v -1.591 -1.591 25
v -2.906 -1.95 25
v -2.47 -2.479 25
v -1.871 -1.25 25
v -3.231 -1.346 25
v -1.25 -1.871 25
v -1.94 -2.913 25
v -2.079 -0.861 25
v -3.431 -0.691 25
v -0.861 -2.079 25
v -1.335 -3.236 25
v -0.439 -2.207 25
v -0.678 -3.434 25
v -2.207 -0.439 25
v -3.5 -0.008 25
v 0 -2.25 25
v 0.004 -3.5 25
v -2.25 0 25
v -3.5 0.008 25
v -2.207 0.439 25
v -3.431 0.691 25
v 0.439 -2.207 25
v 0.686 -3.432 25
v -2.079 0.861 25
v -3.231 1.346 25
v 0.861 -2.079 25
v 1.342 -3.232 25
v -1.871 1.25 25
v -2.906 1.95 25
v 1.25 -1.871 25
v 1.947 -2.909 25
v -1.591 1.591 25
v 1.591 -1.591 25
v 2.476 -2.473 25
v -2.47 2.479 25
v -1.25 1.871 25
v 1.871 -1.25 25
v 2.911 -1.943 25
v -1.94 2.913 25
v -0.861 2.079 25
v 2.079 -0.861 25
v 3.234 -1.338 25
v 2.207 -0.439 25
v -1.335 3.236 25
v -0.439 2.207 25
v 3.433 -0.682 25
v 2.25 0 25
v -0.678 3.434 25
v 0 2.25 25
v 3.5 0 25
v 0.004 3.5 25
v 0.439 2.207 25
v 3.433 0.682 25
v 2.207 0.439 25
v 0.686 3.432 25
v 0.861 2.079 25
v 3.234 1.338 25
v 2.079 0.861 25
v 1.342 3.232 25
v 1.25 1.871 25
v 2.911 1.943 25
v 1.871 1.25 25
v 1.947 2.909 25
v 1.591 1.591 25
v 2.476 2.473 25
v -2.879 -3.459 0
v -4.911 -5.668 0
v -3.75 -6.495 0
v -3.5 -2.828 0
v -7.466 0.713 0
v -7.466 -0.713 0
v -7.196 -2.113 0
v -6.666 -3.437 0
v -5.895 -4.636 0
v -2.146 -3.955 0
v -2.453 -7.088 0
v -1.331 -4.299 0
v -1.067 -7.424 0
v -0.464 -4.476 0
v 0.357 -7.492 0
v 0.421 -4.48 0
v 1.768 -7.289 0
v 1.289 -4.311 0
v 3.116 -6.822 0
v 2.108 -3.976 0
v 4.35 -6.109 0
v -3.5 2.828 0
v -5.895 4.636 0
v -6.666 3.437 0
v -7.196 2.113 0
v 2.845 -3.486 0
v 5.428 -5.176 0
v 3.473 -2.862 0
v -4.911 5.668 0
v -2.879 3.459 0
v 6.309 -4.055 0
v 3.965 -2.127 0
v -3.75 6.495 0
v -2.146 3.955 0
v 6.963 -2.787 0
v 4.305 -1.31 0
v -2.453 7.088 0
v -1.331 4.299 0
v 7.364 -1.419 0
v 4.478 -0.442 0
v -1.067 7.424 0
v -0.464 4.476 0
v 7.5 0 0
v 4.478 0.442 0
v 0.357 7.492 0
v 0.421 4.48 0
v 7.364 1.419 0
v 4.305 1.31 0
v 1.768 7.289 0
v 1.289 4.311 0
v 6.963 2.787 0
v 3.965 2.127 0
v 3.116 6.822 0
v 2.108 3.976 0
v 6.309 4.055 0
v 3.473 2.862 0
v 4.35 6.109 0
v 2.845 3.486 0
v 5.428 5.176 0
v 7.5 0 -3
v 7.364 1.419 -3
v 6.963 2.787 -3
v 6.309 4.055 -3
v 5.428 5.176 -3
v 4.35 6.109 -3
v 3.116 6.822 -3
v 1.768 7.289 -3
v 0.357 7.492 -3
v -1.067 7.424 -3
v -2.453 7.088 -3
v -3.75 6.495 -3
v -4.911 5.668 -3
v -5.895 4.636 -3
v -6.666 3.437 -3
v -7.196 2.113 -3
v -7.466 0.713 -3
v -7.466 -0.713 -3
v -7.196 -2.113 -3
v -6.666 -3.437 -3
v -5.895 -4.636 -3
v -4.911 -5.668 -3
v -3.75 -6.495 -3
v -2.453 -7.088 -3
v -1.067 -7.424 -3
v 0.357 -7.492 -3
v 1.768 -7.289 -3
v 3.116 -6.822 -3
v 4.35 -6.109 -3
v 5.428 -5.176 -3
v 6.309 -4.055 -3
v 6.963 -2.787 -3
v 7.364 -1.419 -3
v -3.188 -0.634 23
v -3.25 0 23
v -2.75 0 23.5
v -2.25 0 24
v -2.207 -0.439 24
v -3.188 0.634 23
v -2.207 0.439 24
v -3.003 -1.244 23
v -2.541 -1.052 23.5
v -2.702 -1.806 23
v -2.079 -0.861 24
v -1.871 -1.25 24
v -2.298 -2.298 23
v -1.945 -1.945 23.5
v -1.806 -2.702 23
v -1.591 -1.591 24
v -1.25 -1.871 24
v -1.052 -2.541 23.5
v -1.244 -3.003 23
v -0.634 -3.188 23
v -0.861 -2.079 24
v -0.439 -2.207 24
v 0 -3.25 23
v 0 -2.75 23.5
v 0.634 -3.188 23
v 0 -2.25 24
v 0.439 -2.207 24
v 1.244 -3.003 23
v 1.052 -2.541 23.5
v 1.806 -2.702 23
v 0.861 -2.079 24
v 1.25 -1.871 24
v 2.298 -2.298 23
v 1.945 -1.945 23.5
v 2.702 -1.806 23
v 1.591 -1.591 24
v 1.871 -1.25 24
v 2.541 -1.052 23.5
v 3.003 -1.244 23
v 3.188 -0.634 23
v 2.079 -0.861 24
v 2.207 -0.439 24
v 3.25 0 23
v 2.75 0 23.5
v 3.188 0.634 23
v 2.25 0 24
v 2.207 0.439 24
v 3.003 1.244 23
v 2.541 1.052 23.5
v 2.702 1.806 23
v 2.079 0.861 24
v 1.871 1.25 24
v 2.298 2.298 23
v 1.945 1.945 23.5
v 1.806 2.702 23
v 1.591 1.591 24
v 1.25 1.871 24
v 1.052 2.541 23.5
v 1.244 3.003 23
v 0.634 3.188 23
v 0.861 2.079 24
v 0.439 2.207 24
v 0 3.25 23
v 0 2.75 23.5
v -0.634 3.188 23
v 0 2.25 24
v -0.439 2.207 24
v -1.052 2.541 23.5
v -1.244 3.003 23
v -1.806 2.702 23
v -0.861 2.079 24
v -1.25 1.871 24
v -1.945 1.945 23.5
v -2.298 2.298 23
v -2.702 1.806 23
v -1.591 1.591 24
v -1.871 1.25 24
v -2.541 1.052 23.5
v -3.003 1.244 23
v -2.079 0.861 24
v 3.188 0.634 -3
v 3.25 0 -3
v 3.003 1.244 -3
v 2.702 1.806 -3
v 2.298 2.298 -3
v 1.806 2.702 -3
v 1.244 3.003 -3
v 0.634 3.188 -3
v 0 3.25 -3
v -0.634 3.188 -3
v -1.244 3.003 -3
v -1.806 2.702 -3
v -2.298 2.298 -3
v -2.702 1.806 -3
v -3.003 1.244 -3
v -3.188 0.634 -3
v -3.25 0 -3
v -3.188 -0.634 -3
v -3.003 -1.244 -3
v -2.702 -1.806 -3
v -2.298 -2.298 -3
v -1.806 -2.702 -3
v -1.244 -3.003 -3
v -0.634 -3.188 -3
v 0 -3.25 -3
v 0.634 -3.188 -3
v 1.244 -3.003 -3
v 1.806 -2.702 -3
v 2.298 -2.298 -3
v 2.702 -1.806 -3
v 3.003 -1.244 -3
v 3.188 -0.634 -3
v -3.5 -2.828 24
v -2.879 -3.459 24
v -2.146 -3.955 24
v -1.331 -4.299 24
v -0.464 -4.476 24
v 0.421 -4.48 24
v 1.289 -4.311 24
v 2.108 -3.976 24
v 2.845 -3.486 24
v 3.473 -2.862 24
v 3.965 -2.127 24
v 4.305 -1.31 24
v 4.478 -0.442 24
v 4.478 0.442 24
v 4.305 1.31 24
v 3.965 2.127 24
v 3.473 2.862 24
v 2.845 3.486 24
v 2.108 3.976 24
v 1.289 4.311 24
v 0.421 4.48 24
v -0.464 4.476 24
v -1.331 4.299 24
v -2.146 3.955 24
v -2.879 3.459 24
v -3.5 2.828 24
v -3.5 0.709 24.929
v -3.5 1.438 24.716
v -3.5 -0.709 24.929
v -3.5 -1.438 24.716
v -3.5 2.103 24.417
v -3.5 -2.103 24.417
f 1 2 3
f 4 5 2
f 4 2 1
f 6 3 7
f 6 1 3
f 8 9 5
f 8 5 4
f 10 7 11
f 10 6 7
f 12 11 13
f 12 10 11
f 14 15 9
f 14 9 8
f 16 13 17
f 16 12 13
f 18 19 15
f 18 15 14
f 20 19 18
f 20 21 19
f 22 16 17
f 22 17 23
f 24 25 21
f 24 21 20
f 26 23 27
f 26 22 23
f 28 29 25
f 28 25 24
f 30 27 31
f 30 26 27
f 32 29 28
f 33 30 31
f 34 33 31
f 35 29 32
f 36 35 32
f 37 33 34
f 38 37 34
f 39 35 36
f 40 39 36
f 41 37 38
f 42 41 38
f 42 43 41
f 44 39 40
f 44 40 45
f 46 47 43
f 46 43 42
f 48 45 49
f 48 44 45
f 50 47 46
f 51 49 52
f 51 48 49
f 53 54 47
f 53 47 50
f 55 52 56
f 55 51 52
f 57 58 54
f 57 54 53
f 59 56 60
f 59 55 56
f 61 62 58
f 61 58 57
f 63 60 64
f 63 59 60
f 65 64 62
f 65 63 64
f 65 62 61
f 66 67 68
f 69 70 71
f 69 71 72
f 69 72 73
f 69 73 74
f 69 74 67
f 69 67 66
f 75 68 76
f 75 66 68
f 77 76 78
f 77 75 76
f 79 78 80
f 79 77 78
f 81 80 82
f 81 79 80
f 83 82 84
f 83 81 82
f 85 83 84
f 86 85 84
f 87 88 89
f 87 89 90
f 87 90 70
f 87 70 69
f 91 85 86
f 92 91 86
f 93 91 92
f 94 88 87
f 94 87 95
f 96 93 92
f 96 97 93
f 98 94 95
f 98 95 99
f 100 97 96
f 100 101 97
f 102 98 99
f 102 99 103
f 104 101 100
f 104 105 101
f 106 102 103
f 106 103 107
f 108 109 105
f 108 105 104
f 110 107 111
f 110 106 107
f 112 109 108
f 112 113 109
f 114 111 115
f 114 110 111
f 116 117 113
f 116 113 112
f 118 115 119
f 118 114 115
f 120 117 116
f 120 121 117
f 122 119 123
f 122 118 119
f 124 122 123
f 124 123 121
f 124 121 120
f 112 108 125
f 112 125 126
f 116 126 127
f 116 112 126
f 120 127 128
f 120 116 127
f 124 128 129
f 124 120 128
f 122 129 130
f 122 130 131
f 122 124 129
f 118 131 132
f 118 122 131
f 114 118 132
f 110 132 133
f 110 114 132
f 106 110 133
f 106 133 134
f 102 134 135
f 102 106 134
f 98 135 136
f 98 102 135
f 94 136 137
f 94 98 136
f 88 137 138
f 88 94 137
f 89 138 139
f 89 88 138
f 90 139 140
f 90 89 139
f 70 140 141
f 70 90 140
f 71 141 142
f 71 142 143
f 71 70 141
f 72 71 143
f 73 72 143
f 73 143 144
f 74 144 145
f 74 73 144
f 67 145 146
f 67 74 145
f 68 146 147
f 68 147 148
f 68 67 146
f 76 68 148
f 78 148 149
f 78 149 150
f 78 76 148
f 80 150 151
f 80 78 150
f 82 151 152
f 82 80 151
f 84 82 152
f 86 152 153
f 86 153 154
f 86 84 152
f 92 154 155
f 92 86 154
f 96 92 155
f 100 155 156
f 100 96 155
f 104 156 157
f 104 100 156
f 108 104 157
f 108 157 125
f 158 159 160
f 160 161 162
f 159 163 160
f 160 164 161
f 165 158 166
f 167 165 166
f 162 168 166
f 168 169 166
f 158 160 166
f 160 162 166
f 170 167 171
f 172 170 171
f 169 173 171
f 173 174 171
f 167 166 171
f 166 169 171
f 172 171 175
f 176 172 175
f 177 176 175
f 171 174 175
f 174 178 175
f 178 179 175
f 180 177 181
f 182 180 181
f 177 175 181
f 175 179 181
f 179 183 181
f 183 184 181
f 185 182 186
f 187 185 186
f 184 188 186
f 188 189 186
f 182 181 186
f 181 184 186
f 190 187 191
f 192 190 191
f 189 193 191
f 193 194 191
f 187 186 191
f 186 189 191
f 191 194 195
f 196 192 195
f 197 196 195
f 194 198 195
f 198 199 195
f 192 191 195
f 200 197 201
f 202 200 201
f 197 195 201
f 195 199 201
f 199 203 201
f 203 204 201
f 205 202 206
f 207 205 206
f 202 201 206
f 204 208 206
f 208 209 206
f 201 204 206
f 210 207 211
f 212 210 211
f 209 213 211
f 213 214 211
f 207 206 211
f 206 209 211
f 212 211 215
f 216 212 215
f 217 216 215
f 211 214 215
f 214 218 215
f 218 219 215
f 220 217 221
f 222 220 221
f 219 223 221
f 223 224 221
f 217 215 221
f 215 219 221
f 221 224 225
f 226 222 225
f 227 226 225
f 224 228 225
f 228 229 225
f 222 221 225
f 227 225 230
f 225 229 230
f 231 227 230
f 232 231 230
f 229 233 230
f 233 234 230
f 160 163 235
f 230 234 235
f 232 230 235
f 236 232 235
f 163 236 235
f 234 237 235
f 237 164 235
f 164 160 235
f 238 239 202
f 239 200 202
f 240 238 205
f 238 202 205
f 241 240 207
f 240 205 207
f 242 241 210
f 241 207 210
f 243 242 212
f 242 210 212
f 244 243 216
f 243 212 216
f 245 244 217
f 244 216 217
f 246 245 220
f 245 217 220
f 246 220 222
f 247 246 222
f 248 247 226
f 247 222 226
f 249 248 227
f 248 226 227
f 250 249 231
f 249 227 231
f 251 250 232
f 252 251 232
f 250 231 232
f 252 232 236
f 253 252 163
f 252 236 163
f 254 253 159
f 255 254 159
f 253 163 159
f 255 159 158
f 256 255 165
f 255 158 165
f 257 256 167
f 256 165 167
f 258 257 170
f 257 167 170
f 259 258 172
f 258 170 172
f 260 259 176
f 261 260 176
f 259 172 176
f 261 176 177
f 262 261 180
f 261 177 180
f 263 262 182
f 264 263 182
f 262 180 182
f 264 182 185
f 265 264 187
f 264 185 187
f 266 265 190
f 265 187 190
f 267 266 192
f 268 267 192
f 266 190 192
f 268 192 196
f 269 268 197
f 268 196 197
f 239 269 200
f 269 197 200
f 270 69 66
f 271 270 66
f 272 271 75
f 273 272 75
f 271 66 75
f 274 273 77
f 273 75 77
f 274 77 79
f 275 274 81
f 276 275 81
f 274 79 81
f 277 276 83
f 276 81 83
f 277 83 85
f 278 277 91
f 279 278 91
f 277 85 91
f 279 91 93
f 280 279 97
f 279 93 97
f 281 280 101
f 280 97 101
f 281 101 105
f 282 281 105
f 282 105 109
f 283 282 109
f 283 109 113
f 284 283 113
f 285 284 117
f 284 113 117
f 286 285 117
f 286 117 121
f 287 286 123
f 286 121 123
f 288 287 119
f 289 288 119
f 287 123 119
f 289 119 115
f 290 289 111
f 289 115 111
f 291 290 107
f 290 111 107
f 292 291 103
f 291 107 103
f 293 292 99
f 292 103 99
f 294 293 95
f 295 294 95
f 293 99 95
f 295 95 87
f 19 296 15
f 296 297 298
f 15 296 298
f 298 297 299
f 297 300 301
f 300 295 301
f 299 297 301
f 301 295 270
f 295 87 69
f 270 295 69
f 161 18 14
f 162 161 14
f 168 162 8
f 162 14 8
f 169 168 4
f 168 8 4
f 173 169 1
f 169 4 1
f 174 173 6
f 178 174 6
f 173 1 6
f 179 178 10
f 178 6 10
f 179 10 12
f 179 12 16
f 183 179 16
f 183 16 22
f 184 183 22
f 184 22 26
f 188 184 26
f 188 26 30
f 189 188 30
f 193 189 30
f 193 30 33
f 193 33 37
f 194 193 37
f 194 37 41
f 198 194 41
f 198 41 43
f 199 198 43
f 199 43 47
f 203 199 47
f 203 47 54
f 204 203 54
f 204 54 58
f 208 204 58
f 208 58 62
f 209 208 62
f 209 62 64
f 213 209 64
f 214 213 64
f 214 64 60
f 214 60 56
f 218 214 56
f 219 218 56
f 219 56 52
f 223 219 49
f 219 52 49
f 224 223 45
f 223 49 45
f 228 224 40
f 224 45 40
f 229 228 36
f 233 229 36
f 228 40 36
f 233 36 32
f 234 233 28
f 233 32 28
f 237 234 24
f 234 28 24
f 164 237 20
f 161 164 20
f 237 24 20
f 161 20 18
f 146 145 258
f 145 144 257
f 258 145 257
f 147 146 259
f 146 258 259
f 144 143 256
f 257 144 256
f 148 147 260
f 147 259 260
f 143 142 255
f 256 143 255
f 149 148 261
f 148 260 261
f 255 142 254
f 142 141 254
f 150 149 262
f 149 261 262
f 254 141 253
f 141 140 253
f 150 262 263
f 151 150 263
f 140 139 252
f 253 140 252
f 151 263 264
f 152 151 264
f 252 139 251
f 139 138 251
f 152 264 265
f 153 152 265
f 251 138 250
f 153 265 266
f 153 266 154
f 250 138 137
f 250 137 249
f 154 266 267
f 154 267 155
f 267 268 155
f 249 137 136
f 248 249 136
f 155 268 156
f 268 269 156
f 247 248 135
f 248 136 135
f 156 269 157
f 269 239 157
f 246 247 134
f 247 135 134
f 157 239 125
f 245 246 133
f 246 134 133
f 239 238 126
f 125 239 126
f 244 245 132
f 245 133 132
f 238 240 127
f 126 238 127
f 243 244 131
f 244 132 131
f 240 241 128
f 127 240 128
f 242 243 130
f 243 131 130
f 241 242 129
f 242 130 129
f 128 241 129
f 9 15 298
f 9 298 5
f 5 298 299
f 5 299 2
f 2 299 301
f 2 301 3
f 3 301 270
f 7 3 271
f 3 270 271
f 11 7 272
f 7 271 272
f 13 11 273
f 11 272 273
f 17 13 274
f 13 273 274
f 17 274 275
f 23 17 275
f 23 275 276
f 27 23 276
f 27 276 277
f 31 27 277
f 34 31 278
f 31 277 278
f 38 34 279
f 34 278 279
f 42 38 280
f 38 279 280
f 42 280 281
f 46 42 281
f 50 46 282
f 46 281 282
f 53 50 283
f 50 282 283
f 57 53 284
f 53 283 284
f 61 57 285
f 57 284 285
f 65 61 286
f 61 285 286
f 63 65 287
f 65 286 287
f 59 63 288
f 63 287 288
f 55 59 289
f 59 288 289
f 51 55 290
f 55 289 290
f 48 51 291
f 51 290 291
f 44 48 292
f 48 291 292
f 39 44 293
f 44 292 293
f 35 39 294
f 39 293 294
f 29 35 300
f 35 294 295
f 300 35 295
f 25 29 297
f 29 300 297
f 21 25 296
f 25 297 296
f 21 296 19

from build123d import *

# Parameters (mm, degrees)
F1_DEPTH       = 25
F0_R           = 7.5
F2_DEPTH       = 3
F3_D           = 6.5
F3_DEPTH       = 3.001
F4_D           = 4.5
F4_DEPTH       = 25
F4_CBORE_D     = 6.5
F4_CBORE_DEPTH = 23
F4_TIP         = 1.3519363928
F5_SIZE        = 0.99999


# Not quite as in the source:
# - a fillet or chamfer is up to 0.001 mm smaller than in the source, because OpenCascade refuses the exact size


with BuildPart() as f1:
    # F0 (on Top) → F1 (new body)
    with BuildSketch(Plane.XY):
        with BuildLine():
            Line((-3.5, 2.8284271247), (-3.5, -2.8284271247))
            ThreePointArc((-3.5, -2.8284271247), (4.5, 0), (-3.5, 2.8284271247))
        make_face()
    extrude(amount=F1_DEPTH)

    # F0 (on Top) → F2 (join)
    with BuildSketch(Plane.XY):
        Circle(F0_R)
        with BuildLine():
            ThreePointArc((-3.5, 2.8284271247), (4.5, 0), (-3.5, -2.8284271247))
            Line((-3.5, -2.8284271247), (-3.5, 2.8284271247))
        make_face(mode=Mode.SUBTRACT)
        with BuildLine():
            Line((-3.5, 2.8284271247), (-3.5, -2.8284271247))
            ThreePointArc((-3.5, -2.8284271247), (4.5, 0), (-3.5, 2.8284271247))
        make_face()
    extrude(amount=-F2_DEPTH)

    # F3 (through all, one way)
    with BuildSketch(Plane.XY):
        with Locations((0, 0)):
            Circle(F3_D / 2)
    extrude(amount=-F3_DEPTH, mode=Mode.SUBTRACT)

    # F4
    with Locations(Plane(origin=(0, 0, 0), x_dir=(1, 0, 0), z_dir=(0, 0, -1))):
        with Locations((0, 0)):
            CounterBoreHole(F4_D / 2, F4_CBORE_D / 2, F4_CBORE_DEPTH, depth=F4_DEPTH)
            with Locations((0, 0, -(F4_DEPTH + F4_TIP / 2))):  # 118° drill point
                Cone(0, F4_D / 2, F4_TIP, mode=Mode.SUBTRACT)

    # F5 (size 1 in the source; OpenCascade refuses exactly that, so slightly less here)
    f5_edges = [f1.edges().sort_by_distance(p)[0] for p in [
        (4.5, 0, 25),
        (-2.25, 0, 23),
    ]]
    chamfer(f5_edges, length=F5_SIZE)


solid = f1.part
